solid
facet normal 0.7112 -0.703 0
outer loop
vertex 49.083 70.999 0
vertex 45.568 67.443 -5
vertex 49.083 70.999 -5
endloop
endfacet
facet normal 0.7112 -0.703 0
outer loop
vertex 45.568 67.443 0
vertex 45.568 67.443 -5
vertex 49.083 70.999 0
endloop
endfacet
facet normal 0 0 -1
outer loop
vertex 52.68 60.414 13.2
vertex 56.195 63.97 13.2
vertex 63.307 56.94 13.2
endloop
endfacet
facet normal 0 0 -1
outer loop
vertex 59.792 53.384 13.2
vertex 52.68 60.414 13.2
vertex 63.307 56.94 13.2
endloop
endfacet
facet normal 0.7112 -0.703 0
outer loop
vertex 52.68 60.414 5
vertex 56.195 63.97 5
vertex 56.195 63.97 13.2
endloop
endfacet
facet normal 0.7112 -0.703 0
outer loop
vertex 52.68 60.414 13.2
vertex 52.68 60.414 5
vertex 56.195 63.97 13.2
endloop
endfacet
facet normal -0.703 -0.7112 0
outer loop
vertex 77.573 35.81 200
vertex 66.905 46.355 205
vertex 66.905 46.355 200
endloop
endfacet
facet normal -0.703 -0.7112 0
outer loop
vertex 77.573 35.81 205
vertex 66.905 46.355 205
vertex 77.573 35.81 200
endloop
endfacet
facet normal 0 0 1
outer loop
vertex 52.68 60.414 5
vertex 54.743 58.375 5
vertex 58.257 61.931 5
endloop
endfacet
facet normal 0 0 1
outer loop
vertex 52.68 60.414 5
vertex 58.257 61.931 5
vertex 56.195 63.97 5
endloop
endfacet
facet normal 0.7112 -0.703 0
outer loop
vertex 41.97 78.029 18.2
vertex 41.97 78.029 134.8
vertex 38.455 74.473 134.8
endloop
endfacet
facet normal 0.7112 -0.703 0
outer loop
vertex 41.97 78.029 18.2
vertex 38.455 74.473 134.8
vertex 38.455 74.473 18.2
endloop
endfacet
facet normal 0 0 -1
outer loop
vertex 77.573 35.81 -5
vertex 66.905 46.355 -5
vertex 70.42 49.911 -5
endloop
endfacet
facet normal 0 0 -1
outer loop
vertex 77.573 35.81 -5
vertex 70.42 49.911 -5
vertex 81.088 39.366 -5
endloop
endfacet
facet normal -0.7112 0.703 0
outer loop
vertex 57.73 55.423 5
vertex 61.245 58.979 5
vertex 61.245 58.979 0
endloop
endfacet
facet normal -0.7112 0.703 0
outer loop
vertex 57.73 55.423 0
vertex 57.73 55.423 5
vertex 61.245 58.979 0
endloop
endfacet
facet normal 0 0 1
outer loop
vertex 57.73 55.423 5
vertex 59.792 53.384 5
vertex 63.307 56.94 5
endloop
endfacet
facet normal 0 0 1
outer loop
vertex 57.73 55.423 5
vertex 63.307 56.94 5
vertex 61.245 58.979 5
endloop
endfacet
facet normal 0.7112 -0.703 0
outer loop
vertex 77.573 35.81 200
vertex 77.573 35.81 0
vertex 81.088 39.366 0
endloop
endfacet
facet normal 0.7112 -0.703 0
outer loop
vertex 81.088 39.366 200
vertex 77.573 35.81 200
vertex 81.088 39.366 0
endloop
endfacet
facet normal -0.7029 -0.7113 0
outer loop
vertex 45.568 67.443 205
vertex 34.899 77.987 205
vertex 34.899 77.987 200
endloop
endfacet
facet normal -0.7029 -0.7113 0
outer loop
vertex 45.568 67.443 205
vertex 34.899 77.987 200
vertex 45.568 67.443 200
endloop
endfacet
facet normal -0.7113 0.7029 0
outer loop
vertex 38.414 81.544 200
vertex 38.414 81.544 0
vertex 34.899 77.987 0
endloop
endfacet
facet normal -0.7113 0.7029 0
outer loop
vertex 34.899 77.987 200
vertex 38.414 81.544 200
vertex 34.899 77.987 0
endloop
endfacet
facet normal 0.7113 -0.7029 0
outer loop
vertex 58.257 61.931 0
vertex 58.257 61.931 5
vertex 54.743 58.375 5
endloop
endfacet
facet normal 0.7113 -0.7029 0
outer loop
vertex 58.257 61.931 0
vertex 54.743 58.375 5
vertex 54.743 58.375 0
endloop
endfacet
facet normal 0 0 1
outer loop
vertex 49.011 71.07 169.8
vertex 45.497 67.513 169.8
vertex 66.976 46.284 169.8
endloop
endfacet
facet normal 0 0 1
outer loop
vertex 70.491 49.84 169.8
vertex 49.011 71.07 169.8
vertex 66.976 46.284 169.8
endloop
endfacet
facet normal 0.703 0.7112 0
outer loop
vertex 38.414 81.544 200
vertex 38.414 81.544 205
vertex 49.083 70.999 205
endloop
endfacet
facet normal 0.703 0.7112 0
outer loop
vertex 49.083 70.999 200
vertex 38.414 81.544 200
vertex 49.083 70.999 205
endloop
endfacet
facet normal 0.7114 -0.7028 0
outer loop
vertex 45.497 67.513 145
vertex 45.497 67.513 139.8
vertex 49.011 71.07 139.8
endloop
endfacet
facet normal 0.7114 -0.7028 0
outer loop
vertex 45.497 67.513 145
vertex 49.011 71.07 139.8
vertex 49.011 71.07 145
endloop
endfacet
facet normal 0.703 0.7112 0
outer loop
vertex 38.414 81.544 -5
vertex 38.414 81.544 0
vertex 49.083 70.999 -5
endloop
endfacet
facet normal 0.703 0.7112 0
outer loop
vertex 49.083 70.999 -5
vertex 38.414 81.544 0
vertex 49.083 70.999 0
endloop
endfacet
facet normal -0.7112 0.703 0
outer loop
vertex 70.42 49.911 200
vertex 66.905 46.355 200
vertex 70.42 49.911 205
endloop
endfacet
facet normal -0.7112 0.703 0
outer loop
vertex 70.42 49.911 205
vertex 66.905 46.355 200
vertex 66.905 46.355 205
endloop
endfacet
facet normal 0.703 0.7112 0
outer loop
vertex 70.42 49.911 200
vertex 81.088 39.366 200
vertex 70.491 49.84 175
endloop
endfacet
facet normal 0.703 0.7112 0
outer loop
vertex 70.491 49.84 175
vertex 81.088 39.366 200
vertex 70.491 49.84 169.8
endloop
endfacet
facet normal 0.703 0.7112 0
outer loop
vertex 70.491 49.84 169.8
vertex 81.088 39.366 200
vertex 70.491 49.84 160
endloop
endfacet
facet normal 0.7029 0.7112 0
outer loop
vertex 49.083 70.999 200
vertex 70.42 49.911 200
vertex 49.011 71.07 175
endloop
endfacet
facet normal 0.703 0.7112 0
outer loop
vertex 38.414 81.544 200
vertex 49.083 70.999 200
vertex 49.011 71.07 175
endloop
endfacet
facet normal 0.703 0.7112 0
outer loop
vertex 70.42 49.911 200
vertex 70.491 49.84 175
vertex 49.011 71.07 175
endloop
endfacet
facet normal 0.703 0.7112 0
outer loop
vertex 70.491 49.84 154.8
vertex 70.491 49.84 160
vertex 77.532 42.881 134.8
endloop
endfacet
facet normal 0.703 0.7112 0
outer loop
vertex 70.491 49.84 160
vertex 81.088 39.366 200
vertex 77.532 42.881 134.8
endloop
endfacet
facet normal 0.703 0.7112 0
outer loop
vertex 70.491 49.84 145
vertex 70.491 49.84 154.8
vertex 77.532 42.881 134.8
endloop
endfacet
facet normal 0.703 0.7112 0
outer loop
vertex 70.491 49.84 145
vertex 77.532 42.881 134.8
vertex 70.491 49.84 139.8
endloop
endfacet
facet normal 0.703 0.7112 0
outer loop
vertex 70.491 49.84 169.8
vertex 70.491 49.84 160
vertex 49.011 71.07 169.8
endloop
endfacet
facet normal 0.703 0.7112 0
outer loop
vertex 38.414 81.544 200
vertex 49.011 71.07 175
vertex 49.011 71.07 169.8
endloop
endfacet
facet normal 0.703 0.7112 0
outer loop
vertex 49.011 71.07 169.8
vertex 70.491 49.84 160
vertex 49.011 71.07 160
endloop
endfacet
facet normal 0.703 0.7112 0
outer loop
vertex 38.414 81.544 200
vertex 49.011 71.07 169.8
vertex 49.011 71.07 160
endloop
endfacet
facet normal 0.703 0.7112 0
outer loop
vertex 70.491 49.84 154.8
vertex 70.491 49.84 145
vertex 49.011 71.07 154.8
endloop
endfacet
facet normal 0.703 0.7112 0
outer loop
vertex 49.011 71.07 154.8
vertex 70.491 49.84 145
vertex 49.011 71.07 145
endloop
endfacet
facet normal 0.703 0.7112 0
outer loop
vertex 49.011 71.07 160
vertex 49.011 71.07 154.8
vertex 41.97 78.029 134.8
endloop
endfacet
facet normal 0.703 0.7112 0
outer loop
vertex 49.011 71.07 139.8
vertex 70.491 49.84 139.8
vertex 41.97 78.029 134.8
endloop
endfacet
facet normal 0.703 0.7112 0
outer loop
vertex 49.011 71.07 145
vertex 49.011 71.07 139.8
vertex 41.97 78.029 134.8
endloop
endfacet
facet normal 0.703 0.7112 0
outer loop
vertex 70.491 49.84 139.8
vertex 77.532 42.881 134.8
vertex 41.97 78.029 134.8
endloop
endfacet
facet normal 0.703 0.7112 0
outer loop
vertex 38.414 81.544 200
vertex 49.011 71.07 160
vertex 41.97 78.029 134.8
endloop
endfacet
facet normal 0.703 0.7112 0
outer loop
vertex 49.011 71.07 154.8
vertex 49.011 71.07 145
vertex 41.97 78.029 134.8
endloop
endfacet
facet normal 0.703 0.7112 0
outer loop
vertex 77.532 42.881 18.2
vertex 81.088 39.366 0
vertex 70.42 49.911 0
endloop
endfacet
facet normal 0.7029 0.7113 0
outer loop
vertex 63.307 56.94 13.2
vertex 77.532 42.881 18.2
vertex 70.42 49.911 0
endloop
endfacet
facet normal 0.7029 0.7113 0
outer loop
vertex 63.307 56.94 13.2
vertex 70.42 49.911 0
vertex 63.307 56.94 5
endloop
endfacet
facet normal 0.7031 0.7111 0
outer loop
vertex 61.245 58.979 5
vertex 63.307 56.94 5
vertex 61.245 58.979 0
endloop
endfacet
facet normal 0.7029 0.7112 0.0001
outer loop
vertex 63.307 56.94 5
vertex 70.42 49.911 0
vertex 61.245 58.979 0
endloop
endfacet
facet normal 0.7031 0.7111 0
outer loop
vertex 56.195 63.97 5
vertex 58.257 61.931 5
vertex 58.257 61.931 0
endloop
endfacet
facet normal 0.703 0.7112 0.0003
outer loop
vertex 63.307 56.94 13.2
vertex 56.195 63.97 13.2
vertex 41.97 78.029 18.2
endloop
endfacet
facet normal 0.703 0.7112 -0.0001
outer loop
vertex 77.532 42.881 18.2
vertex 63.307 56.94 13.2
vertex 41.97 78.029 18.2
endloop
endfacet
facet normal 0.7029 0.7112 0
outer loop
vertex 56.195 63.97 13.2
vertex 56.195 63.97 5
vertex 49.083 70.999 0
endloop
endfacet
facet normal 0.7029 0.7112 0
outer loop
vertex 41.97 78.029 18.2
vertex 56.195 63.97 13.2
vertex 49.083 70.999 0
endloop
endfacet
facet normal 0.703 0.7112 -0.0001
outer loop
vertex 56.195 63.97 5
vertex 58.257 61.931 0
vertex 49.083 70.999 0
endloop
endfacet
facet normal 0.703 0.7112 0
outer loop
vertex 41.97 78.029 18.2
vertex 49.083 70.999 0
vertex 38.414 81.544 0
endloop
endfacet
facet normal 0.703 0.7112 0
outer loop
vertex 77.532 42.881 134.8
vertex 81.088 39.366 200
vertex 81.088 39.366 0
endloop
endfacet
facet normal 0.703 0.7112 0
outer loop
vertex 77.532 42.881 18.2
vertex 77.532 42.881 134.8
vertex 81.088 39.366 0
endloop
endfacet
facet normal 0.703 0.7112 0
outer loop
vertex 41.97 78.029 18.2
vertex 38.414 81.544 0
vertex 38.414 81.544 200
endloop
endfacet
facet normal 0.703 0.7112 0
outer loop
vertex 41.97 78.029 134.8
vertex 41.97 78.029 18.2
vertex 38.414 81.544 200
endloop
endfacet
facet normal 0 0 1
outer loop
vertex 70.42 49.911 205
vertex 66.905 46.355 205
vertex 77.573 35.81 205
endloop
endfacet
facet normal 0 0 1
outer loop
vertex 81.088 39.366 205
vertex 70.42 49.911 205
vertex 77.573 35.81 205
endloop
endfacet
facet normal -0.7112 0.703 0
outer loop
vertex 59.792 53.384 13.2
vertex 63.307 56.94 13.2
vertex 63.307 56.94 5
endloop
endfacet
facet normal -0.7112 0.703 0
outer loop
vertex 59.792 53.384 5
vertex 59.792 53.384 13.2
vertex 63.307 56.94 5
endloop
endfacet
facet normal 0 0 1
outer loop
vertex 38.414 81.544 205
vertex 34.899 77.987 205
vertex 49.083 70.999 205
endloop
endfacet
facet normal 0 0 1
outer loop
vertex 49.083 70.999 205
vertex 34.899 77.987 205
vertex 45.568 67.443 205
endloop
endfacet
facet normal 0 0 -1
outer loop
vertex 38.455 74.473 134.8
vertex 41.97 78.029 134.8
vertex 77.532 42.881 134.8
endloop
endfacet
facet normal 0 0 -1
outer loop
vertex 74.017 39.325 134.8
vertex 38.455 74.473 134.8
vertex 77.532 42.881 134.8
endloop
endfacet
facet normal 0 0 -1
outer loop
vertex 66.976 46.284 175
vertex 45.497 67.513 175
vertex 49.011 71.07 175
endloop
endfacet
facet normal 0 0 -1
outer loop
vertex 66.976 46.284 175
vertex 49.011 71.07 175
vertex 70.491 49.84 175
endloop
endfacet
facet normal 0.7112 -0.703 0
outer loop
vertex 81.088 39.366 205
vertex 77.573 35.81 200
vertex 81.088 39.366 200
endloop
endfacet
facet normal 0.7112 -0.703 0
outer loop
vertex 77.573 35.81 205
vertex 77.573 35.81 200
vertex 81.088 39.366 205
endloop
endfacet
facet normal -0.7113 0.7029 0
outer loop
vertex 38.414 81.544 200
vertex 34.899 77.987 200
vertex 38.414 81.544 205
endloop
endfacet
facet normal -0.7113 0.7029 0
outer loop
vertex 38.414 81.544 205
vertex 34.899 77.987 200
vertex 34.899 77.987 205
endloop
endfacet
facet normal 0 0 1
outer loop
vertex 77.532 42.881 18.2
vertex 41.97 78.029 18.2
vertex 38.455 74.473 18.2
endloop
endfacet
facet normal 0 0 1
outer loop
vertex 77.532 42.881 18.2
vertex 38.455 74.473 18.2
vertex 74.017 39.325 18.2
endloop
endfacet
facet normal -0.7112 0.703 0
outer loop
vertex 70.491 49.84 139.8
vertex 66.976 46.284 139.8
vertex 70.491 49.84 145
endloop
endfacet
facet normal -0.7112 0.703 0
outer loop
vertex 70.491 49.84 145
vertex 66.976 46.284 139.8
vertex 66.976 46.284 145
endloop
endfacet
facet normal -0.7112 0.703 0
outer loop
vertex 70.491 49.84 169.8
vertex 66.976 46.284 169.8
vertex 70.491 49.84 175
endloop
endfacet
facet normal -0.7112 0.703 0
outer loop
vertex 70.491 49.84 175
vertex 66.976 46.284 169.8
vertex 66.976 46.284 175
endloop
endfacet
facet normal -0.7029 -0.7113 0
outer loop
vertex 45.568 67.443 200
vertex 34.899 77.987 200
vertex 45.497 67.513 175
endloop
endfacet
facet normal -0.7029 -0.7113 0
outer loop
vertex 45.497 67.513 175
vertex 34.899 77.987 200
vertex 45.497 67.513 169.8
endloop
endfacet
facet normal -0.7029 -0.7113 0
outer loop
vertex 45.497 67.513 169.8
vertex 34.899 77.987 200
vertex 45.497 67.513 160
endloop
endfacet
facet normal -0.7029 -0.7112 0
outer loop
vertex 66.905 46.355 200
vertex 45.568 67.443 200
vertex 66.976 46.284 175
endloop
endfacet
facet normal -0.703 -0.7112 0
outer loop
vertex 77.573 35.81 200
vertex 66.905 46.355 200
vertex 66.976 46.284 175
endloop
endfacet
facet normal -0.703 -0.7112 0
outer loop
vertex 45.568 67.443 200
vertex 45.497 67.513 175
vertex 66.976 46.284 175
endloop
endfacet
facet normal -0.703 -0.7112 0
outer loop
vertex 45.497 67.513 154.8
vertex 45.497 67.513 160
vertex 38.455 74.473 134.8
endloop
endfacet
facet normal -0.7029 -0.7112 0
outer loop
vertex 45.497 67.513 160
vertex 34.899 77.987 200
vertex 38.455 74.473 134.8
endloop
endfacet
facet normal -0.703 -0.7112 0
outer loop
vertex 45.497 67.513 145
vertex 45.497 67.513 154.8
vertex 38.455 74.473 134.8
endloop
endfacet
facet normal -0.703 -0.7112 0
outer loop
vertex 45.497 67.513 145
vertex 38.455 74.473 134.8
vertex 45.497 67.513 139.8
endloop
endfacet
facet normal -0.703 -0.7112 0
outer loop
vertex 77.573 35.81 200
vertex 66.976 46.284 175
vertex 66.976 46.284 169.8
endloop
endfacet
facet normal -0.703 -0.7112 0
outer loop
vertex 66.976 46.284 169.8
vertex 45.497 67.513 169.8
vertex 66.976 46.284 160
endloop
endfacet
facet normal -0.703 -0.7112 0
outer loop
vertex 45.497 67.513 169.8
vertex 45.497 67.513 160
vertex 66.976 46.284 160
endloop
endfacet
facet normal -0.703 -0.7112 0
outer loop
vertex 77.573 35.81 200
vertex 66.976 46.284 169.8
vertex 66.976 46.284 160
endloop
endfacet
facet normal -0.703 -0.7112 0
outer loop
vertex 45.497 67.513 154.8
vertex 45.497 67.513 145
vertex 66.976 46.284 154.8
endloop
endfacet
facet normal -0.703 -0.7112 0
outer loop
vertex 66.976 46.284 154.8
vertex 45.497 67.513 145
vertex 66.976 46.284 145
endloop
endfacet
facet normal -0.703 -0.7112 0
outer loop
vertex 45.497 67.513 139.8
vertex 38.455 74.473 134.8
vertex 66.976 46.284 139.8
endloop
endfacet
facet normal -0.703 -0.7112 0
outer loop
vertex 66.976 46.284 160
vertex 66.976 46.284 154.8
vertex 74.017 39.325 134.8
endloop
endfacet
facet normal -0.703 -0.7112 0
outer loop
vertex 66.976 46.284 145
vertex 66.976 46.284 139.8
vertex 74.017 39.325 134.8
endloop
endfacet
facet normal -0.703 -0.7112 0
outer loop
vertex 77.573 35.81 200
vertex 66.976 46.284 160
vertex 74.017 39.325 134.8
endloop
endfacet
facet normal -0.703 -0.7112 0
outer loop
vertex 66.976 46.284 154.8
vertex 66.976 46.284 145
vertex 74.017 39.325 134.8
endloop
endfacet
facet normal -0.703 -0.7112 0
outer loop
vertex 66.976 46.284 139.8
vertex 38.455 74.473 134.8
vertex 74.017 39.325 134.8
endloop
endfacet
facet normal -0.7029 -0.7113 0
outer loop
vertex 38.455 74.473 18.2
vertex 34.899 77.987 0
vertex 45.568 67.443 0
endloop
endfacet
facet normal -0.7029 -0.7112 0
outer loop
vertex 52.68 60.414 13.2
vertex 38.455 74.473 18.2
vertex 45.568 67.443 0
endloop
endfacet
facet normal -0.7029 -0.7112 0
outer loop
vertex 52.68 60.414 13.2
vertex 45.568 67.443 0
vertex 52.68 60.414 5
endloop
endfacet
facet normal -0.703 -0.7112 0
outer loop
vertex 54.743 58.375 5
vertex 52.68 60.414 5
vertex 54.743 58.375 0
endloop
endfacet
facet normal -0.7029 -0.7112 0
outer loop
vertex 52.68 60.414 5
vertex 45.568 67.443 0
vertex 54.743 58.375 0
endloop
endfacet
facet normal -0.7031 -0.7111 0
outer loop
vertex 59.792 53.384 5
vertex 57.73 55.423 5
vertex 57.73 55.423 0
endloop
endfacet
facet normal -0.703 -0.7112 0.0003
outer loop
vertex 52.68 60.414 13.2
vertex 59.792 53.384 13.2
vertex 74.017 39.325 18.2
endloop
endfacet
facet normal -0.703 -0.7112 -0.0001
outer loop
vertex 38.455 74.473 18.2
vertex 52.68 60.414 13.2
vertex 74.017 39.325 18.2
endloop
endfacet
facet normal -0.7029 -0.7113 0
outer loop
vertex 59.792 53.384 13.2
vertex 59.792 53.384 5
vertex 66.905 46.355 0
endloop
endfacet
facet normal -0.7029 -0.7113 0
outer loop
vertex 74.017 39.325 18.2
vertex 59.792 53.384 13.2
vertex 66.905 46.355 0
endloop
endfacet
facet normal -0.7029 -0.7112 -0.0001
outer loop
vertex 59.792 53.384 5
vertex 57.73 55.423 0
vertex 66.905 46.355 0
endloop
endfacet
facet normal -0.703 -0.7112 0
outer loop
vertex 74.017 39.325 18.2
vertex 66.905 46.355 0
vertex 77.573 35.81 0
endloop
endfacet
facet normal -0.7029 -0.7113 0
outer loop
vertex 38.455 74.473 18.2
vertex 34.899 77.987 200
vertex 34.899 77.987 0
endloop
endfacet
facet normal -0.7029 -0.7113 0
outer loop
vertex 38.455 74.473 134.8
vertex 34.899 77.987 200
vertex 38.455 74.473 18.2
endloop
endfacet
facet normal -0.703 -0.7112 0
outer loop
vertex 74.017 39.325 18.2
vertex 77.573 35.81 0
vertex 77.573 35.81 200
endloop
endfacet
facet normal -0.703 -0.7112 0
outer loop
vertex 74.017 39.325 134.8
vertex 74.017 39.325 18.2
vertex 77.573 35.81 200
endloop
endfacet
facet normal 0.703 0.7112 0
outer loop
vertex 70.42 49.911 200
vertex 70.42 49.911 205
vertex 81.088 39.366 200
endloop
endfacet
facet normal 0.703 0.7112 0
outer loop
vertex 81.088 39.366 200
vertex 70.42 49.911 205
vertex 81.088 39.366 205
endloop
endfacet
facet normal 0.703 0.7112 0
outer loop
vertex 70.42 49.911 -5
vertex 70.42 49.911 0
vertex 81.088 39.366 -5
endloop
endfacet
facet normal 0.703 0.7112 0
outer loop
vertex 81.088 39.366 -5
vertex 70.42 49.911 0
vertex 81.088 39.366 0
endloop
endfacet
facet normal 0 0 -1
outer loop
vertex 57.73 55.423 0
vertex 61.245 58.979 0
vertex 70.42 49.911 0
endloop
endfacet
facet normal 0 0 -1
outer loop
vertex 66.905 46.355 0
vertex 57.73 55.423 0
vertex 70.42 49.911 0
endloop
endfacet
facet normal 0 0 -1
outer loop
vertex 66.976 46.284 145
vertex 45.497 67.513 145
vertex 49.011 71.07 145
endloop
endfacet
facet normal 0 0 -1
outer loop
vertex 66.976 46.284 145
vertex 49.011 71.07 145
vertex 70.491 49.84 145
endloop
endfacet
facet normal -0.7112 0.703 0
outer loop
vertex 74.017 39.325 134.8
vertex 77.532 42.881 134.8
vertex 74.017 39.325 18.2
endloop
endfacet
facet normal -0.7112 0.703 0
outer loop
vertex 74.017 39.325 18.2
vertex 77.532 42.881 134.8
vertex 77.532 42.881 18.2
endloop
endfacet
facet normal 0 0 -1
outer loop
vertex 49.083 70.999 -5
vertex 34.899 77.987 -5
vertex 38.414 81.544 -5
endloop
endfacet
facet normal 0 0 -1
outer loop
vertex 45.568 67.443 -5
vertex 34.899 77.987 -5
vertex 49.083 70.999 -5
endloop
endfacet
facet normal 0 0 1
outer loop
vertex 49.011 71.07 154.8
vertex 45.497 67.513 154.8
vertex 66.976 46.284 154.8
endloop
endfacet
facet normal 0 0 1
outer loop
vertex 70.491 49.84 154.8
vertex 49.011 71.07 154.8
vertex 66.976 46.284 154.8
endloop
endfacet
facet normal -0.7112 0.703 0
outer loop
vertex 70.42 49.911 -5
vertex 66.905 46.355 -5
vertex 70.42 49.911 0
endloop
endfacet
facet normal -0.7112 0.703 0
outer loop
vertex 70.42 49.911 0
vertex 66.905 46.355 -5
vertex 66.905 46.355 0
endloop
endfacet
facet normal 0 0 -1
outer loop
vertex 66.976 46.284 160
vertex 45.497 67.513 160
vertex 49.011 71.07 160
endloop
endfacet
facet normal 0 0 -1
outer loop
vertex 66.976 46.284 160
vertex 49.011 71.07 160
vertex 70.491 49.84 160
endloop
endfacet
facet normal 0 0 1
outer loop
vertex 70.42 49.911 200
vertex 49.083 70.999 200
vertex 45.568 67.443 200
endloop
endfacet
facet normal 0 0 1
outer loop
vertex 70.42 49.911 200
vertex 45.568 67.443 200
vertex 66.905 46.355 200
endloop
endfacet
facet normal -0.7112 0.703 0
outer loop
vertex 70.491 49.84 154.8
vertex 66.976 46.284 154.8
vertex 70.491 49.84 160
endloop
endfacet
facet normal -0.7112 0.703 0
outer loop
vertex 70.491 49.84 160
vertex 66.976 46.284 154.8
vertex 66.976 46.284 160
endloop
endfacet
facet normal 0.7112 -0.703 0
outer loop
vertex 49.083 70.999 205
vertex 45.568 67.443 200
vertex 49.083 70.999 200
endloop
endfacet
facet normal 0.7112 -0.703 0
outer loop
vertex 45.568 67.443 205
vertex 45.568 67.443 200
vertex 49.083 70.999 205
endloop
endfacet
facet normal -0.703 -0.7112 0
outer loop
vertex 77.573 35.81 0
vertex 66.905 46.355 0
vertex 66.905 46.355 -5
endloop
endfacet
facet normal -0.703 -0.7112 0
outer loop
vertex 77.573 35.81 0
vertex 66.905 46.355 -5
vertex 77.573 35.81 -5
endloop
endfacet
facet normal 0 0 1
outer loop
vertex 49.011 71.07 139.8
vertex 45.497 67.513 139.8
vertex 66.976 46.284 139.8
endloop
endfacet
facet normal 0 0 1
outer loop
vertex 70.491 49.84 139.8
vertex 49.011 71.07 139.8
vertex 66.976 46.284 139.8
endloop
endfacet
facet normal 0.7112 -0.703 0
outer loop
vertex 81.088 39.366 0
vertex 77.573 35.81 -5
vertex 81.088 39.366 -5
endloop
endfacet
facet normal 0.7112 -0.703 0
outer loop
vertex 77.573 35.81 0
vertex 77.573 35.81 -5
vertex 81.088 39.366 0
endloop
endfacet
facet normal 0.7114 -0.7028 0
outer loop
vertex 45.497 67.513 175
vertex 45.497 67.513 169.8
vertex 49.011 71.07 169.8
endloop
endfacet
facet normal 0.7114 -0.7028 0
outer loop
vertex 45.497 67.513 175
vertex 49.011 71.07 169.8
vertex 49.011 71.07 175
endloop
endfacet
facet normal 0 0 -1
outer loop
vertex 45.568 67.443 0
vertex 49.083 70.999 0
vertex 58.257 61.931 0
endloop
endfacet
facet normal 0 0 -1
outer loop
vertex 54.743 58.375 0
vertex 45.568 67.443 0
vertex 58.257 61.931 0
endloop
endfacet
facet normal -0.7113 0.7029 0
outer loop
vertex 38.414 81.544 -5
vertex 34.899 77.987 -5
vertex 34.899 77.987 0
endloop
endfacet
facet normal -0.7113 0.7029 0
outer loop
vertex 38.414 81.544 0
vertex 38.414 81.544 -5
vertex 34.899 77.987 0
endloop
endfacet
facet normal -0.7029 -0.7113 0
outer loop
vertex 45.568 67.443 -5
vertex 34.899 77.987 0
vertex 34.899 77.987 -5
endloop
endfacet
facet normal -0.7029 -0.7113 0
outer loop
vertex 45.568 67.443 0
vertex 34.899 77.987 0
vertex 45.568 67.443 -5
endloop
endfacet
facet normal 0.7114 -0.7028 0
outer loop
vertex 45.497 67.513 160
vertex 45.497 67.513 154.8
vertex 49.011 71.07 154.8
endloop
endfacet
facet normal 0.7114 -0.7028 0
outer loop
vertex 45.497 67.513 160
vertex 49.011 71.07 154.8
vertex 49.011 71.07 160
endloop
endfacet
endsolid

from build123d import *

# Parameters (mm, degrees)
BOSS_EXTRUDE1_DEPTH = 200
SKETCH3_W           = 15
SKETCH3_H           = 5
BOSS_EXTRUDE2_DEPTH = 5
SKETCH4_W           = 30.2
SKETCH4_H           = 5.2
CUT_EXTRUDE1_DEPTH  = 5
SKETCH5_W           = 4.2
SKETCH5_H           = 5
CUT_EXTRUDE2_DEPTH  = 10
SKETCH6_W           = 50
SKETCH6_H           = 116.6
CUT_EXTRUDE3_DEPTH  = 10


with BuildPart() as part:
    # Sketch1 → Boss-Extrude1 (new body)
    with BuildSketch(Plane.XY):
        Polygon((34.899243254, 77.987452967), (77.573371526, 35.810222425), (81.088140738, 39.366399781), (38.414012466, 81.543630323), align=None)
    extrude(amount=BOSS_EXTRUDE1_DEPTH)

    # Sketch3 → Boss-Extrude2 (add)
    with BuildSketch(Plane(origin=(56.23630739, 56.898837696, 0), x_dir=(0.711235471, -0.702953842, 0), z_dir=(-0.702953842, -0.711235471, 0))):
        with Locations((-22.5, 202.5)):
            Rectangle(SKETCH3_W, SKETCH3_H)
        with Locations((22.5, 202.5)):
            Rectangle(SKETCH3_W, SKETCH3_H)
        with Locations((22.5, -2.5)):
            Rectangle(SKETCH3_W, SKETCH3_H)
        with Locations((-22.5, -2.5)):
            Rectangle(SKETCH3_W, SKETCH3_H)
    extrude(amount=-BOSS_EXTRUDE2_DEPTH)

    # Sketch4 → Cut-Extrude1 (cut)
    with BuildSketch(Plane(origin=(56.23630739, 56.898837696, 0), x_dir=(0.711235471, -0.702953842, 0), z_dir=(-0.702953842, -0.711235471, 0))):
        with Locations((0, 172.4)):
            Rectangle(SKETCH4_W, SKETCH4_H)
        with Locations((0, 157.4)):
            Rectangle(SKETCH4_W, SKETCH4_H)
        with Locations((0, 142.4)):
            Rectangle(SKETCH4_W, SKETCH4_H)
    extrude(amount=-CUT_EXTRUDE1_DEPTH, mode=Mode.SUBTRACT)

    # Sketch5 → Cut-Extrude2 (cut)
    with BuildSketch(Plane(origin=(59.751076602, 60.455015052, 0), x_dir=(0.711235471, -0.702953842, 0), z_dir=(0.702953842, 0.711235471, 0))):
        Polygon((2.1, -5), (-2.1, -5), (-5, -5), (-5, -13.2), (5, -13.2), (5, -5), align=None)
        with Locations((0, -2.5)):
            Rectangle(SKETCH5_W, SKETCH5_H)
    extrude(amount=-CUT_EXTRUDE2_DEPTH, mode=Mode.SUBTRACT)

    # Sketch6 → Cut-Extrude3 (cut)
    with BuildSketch(Plane(origin=(59.751076602, 60.455015052, 0), x_dir=(0.711235471, -0.702953842, 0), z_dir=(0.702953842, 0.711235471, 0))):
        with Locations((0, -76.5)):
            Rectangle(SKETCH6_W, SKETCH6_H)
    extrude(amount=-CUT_EXTRUDE3_DEPTH, mode=Mode.SUBTRACT)


solid = part.part
